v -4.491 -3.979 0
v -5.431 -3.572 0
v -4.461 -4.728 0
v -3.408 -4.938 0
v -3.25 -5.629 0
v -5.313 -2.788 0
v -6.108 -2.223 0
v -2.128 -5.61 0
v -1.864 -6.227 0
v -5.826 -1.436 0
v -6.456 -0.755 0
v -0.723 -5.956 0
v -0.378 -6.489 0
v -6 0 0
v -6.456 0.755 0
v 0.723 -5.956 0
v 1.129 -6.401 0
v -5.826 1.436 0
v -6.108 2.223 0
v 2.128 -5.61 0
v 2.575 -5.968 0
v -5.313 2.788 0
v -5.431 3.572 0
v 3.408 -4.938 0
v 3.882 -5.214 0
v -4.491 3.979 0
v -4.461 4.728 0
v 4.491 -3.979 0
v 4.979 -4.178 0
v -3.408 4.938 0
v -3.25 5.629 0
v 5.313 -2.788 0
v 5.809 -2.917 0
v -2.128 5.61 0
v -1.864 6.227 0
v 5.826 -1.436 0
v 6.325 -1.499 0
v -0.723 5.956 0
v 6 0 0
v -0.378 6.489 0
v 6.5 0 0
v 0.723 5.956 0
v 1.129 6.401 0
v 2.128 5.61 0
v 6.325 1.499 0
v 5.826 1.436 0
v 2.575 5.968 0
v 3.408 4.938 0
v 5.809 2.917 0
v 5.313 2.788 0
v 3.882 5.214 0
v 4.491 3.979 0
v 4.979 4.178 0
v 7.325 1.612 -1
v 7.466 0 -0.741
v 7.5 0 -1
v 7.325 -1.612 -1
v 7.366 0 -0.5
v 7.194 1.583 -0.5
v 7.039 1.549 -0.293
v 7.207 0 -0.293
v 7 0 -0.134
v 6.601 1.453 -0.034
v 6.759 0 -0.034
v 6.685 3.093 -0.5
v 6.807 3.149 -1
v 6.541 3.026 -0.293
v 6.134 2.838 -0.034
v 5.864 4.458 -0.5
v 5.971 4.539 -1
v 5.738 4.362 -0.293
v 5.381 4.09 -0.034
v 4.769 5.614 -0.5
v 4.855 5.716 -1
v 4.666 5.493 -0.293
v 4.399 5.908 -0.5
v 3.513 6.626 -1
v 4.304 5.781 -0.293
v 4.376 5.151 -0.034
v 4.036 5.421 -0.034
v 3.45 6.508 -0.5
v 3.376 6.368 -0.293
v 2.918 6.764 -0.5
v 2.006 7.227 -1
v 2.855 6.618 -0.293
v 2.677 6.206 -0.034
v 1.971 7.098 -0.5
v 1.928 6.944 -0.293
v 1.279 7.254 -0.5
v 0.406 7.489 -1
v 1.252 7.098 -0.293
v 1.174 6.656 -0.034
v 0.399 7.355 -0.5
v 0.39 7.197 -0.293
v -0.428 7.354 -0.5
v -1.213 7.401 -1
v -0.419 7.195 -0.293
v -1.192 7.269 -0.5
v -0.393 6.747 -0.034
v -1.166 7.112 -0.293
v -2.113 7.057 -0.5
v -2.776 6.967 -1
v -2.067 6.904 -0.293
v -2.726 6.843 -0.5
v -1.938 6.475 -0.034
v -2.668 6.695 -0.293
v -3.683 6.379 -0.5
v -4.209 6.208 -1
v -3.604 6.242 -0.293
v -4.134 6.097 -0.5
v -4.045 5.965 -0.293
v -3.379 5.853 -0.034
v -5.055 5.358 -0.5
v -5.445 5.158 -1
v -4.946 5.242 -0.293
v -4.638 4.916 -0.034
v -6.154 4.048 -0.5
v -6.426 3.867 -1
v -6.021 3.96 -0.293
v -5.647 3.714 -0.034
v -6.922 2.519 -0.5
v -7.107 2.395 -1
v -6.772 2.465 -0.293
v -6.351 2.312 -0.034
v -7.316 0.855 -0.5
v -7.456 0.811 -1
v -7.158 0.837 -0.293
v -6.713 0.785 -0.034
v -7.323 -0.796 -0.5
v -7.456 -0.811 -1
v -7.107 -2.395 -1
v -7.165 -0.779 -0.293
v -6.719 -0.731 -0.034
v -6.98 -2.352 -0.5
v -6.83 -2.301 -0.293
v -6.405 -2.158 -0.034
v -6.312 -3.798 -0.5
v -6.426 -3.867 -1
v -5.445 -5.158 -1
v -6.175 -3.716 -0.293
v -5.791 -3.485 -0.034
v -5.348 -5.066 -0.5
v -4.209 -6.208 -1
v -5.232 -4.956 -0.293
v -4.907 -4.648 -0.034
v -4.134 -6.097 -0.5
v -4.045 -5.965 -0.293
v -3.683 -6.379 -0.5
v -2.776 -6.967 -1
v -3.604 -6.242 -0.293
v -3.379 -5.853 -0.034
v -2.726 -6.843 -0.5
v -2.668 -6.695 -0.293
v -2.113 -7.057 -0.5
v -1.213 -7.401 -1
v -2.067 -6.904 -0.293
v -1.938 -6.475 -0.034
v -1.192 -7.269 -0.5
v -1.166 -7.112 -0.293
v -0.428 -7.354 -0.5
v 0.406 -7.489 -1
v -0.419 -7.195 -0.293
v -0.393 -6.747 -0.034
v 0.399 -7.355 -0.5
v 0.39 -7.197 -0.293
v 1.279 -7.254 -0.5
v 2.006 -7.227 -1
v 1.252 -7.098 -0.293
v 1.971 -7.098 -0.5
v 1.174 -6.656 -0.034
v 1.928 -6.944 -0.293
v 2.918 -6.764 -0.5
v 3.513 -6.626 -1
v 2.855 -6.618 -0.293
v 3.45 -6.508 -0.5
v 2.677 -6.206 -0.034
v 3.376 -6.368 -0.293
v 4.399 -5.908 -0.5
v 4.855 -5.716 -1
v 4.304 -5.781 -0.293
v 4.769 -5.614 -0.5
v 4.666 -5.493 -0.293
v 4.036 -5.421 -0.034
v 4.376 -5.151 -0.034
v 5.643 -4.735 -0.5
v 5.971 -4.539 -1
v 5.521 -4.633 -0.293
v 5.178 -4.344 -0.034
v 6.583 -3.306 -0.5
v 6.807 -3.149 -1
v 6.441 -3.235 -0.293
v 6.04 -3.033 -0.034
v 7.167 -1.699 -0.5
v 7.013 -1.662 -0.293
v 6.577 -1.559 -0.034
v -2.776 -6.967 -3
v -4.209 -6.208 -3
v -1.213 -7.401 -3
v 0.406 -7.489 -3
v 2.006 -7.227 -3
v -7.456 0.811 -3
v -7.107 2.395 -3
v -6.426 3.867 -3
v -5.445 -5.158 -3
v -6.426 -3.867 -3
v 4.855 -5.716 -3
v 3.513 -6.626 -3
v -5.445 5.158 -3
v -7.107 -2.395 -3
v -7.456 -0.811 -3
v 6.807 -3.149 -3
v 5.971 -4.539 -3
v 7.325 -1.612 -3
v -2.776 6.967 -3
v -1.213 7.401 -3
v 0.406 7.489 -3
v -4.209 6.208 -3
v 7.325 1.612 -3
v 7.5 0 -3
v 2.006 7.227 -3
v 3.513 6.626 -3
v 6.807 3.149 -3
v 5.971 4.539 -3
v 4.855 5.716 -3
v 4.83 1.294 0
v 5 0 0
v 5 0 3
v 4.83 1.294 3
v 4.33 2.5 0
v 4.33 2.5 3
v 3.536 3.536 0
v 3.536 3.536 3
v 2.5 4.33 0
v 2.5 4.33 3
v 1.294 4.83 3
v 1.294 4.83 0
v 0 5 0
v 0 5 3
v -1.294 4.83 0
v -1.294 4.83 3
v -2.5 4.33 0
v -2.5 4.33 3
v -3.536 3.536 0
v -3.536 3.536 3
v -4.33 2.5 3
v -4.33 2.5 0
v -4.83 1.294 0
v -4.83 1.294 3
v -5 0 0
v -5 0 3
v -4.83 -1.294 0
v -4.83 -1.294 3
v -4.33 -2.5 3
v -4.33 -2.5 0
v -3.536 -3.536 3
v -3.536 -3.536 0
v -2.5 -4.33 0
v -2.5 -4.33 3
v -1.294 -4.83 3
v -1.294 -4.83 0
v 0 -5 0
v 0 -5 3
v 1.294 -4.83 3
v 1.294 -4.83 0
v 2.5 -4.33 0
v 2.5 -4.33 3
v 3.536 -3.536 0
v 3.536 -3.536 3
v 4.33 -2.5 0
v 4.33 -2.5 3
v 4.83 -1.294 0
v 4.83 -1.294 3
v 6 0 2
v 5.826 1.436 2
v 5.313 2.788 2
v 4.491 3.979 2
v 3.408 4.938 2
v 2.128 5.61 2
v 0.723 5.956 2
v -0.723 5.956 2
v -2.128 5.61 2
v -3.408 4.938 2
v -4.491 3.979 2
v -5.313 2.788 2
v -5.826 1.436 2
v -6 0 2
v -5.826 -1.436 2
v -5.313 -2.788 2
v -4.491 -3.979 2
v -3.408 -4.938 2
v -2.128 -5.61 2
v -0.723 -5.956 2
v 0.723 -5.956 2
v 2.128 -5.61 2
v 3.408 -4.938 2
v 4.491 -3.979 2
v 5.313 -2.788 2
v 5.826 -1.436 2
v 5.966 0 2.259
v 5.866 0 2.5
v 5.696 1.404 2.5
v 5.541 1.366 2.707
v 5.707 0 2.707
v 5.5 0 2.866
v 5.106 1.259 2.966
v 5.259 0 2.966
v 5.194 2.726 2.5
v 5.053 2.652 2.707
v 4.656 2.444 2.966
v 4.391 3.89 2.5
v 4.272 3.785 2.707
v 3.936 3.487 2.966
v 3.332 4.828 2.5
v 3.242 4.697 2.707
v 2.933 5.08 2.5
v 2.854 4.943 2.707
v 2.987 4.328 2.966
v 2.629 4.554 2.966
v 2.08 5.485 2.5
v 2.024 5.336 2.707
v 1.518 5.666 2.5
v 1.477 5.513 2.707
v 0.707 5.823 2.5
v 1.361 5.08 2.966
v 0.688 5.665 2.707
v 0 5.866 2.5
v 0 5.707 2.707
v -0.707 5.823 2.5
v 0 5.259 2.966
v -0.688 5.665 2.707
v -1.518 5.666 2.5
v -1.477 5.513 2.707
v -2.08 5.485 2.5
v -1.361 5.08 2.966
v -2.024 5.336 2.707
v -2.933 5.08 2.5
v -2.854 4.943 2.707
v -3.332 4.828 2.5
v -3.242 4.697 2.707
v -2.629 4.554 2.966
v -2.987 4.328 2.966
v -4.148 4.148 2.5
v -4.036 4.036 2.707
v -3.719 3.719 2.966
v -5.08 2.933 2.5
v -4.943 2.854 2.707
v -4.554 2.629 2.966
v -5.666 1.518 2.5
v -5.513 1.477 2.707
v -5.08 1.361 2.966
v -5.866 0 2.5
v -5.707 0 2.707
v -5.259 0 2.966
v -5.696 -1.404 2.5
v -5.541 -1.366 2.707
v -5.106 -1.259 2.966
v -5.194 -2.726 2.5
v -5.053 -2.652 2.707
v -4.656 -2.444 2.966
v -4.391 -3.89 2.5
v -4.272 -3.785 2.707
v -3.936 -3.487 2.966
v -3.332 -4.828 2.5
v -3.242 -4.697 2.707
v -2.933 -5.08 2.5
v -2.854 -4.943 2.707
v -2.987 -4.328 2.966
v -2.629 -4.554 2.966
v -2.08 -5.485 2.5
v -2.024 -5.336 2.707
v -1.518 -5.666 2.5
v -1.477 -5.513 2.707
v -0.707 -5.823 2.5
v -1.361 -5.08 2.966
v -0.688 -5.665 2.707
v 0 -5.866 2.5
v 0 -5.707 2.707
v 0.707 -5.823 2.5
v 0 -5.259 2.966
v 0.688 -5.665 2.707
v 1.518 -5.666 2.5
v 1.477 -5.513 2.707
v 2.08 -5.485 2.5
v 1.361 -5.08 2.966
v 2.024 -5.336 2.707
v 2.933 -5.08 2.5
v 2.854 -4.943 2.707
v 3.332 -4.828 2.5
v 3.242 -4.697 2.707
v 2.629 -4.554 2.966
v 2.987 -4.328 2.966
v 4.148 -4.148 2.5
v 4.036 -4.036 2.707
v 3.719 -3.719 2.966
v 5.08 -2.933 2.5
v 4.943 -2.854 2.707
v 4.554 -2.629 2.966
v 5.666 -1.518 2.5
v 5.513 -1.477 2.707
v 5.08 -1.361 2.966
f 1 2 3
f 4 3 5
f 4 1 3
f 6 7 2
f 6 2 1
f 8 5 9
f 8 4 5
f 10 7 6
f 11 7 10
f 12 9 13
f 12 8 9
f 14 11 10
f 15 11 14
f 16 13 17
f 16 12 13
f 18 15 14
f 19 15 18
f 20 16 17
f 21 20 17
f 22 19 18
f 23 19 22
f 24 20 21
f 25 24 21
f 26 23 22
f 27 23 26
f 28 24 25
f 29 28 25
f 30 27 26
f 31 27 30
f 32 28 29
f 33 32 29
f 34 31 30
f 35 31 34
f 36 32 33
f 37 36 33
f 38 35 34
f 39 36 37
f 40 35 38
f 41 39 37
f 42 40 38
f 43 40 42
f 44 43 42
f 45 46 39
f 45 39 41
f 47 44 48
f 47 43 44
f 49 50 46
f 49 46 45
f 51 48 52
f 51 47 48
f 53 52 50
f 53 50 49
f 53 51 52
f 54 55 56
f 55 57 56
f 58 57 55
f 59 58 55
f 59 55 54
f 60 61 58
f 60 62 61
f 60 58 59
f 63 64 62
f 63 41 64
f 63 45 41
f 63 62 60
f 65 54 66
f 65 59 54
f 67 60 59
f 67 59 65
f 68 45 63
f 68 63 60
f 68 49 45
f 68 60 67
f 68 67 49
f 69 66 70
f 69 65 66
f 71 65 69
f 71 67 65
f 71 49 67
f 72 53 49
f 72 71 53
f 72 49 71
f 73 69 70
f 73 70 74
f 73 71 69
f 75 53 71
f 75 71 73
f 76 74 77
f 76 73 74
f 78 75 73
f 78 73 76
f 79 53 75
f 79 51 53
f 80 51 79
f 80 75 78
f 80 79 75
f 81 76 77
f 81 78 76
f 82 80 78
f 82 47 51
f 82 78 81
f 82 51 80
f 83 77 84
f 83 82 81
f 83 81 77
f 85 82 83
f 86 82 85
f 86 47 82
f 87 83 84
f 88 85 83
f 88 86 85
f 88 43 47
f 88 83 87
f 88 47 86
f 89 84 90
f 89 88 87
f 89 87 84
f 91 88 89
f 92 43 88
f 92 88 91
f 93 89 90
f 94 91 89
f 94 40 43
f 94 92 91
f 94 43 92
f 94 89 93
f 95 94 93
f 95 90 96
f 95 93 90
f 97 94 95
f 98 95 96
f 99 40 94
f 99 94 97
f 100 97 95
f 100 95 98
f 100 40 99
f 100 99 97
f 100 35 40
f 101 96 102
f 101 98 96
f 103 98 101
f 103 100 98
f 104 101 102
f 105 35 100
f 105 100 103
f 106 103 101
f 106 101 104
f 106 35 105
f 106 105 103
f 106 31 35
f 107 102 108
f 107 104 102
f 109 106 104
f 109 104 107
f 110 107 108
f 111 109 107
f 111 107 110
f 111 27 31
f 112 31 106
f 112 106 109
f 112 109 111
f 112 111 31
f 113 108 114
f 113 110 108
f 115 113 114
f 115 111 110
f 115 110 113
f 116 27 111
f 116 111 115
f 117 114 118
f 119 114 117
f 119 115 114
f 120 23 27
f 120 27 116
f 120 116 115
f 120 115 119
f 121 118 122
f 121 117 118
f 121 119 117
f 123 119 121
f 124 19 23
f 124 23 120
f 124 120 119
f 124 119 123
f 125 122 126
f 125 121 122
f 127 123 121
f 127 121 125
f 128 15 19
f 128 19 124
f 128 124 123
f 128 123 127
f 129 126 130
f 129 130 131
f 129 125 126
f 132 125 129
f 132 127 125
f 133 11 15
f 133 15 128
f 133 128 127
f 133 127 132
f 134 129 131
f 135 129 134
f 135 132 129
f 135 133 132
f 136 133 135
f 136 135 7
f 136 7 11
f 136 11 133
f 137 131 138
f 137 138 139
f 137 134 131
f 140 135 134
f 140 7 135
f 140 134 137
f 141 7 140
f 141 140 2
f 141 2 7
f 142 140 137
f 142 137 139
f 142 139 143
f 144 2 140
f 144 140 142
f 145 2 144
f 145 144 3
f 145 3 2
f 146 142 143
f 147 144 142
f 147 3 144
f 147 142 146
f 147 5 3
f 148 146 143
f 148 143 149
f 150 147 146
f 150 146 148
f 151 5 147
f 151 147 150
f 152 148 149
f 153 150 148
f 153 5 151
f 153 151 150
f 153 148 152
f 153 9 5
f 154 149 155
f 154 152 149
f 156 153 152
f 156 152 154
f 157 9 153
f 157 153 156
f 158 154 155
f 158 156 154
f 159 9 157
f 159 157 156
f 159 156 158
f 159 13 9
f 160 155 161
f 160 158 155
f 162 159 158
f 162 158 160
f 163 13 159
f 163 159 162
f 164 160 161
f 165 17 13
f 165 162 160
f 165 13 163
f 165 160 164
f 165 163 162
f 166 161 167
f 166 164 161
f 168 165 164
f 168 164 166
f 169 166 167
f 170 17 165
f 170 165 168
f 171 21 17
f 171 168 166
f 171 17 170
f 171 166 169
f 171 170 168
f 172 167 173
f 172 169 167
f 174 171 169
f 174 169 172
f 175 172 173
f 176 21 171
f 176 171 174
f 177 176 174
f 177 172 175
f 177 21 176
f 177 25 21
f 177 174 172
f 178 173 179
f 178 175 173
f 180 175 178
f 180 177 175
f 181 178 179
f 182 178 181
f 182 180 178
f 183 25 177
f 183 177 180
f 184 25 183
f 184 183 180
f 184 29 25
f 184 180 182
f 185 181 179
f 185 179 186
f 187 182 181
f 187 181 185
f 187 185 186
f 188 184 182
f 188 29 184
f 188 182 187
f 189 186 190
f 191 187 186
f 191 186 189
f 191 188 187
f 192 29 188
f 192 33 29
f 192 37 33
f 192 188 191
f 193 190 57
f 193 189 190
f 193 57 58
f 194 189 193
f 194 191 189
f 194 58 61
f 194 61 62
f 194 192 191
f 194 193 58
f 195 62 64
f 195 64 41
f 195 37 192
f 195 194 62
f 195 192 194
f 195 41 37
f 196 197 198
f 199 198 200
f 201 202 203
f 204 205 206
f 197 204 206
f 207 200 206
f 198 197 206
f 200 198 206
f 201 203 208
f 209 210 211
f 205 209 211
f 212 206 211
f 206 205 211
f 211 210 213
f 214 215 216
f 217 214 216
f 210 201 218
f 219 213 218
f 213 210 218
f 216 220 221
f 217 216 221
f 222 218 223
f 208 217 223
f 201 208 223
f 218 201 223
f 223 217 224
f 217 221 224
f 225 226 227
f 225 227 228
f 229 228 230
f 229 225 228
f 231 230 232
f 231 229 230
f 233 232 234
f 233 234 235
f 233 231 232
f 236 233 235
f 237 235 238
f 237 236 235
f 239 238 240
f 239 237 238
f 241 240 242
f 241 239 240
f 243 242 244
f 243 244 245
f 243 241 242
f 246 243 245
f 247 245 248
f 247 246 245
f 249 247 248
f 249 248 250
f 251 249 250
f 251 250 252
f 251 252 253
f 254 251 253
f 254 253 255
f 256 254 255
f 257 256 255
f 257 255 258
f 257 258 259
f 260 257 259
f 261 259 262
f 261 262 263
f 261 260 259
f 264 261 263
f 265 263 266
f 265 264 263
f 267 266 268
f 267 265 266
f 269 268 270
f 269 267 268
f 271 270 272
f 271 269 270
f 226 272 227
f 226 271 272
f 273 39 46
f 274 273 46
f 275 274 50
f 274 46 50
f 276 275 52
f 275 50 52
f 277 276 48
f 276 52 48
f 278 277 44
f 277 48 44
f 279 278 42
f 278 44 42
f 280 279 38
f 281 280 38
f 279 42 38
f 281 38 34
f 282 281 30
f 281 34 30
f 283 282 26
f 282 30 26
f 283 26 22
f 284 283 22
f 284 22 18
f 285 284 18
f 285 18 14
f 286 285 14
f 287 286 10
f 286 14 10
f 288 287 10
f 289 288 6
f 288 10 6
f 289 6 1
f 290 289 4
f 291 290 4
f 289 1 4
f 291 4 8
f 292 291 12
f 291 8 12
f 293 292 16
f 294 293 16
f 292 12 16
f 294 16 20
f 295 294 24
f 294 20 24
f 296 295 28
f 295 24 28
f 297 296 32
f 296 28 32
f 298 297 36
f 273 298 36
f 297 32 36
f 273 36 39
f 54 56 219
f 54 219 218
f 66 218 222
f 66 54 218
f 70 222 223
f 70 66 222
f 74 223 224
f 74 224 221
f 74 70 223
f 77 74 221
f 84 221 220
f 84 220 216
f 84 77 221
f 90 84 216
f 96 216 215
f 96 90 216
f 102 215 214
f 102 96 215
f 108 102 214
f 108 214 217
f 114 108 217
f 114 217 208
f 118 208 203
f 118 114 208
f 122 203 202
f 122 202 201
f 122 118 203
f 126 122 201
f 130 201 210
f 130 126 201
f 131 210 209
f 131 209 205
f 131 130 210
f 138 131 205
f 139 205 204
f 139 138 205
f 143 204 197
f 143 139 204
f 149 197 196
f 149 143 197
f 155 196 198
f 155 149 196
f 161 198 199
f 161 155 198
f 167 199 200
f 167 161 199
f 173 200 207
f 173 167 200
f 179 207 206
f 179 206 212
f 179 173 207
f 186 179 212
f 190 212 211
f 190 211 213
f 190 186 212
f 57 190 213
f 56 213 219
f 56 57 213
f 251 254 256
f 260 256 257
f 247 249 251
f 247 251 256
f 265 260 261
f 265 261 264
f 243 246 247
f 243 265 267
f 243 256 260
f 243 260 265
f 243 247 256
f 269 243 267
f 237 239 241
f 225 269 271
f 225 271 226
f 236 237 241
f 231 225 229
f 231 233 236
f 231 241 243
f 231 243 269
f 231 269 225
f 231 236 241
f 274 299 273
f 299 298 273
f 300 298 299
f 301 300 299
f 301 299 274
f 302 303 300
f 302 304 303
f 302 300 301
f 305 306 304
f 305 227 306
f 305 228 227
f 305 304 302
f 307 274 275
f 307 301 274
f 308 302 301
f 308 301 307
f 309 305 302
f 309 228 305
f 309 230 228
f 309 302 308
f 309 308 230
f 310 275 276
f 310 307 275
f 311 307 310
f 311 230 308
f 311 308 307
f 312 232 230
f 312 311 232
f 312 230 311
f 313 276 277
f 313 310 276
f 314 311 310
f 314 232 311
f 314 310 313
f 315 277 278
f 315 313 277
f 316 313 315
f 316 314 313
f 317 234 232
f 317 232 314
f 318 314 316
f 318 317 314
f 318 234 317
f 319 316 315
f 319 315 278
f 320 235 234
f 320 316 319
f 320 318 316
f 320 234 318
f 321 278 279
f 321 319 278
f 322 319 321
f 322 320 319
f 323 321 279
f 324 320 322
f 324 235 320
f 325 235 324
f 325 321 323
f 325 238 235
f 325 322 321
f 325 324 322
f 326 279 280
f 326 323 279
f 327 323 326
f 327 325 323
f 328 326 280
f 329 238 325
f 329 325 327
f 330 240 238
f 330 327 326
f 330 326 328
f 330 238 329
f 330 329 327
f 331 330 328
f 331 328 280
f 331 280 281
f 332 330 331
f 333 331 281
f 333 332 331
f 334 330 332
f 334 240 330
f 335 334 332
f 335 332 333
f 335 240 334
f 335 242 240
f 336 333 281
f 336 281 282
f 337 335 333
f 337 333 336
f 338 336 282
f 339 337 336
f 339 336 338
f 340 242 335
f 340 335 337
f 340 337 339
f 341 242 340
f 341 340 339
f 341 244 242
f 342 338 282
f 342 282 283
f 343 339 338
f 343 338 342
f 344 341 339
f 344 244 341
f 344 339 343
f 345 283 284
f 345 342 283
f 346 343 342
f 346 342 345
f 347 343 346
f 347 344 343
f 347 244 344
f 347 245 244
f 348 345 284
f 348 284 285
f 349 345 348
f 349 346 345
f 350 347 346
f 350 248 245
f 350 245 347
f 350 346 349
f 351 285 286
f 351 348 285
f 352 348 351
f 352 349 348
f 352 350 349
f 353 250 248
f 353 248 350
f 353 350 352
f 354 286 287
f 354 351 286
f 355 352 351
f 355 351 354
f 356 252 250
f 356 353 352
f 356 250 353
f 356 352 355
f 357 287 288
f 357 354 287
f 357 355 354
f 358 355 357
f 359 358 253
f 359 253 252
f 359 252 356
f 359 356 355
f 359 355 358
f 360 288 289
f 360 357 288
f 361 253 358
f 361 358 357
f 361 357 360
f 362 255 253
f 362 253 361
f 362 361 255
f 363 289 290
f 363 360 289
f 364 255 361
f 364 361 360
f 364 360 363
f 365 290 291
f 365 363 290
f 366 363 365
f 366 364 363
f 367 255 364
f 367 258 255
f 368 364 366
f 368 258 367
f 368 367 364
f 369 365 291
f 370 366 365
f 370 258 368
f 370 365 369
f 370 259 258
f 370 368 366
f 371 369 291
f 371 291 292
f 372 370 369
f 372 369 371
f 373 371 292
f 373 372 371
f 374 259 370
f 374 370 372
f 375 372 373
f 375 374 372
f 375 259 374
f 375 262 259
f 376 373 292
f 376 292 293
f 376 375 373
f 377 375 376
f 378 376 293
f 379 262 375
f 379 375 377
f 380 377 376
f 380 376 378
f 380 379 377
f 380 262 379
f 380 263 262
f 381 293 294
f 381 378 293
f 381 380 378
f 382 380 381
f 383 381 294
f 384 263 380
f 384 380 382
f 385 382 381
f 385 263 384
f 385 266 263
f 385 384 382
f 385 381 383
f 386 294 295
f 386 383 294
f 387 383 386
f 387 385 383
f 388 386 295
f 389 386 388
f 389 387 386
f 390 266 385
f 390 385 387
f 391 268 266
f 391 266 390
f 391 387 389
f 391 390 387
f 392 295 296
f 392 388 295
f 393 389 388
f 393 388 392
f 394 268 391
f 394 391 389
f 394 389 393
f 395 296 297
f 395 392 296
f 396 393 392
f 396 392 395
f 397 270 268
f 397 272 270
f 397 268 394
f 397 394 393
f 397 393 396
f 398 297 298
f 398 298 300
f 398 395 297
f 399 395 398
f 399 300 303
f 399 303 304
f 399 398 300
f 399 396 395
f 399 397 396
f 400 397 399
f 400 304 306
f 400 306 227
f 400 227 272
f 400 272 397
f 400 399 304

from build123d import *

# Parameters (mm, degrees)
F0_R     = 7.5
F0_R_2   = 6
F0_R_3   = 5
F1_DEPTH = 3
F2_DEPTH = 3
F3_R     = 0.99999


# Not quite as in the source:
# - a fillet or chamfer is up to 0.001 mm smaller than in the source, because OpenCascade refuses the exact size


with BuildPart() as f1:
    # F0 (on Top) → F1 (new body)
    with BuildSketch(Plane.XY):
        Circle(F0_R)
        Circle(F0_R_2, mode=Mode.SUBTRACT)
        Circle(F0_R_2)
        Circle(F0_R_3, mode=Mode.SUBTRACT)
        Circle(F0_R_3)
    extrude(amount=-F1_DEPTH)

    # F0 (on Top) → F2 (join)
    with BuildSketch(Plane.XY):
        Circle(F0_R_2)
        Circle(F0_R_3, mode=Mode.SUBTRACT)
    extrude(amount=F2_DEPTH)

    # F3 (radius 1 in the source; OpenCascade refuses exactly that, so slightly less here)
    f3_edges = [f1.edges().sort_by_distance(p)[0] for p in [
        (-7.5, 0, 0),
        (-6, 0, 3),
    ]]
    fillet(f3_edges, radius=F3_R)


solid = f1.part
